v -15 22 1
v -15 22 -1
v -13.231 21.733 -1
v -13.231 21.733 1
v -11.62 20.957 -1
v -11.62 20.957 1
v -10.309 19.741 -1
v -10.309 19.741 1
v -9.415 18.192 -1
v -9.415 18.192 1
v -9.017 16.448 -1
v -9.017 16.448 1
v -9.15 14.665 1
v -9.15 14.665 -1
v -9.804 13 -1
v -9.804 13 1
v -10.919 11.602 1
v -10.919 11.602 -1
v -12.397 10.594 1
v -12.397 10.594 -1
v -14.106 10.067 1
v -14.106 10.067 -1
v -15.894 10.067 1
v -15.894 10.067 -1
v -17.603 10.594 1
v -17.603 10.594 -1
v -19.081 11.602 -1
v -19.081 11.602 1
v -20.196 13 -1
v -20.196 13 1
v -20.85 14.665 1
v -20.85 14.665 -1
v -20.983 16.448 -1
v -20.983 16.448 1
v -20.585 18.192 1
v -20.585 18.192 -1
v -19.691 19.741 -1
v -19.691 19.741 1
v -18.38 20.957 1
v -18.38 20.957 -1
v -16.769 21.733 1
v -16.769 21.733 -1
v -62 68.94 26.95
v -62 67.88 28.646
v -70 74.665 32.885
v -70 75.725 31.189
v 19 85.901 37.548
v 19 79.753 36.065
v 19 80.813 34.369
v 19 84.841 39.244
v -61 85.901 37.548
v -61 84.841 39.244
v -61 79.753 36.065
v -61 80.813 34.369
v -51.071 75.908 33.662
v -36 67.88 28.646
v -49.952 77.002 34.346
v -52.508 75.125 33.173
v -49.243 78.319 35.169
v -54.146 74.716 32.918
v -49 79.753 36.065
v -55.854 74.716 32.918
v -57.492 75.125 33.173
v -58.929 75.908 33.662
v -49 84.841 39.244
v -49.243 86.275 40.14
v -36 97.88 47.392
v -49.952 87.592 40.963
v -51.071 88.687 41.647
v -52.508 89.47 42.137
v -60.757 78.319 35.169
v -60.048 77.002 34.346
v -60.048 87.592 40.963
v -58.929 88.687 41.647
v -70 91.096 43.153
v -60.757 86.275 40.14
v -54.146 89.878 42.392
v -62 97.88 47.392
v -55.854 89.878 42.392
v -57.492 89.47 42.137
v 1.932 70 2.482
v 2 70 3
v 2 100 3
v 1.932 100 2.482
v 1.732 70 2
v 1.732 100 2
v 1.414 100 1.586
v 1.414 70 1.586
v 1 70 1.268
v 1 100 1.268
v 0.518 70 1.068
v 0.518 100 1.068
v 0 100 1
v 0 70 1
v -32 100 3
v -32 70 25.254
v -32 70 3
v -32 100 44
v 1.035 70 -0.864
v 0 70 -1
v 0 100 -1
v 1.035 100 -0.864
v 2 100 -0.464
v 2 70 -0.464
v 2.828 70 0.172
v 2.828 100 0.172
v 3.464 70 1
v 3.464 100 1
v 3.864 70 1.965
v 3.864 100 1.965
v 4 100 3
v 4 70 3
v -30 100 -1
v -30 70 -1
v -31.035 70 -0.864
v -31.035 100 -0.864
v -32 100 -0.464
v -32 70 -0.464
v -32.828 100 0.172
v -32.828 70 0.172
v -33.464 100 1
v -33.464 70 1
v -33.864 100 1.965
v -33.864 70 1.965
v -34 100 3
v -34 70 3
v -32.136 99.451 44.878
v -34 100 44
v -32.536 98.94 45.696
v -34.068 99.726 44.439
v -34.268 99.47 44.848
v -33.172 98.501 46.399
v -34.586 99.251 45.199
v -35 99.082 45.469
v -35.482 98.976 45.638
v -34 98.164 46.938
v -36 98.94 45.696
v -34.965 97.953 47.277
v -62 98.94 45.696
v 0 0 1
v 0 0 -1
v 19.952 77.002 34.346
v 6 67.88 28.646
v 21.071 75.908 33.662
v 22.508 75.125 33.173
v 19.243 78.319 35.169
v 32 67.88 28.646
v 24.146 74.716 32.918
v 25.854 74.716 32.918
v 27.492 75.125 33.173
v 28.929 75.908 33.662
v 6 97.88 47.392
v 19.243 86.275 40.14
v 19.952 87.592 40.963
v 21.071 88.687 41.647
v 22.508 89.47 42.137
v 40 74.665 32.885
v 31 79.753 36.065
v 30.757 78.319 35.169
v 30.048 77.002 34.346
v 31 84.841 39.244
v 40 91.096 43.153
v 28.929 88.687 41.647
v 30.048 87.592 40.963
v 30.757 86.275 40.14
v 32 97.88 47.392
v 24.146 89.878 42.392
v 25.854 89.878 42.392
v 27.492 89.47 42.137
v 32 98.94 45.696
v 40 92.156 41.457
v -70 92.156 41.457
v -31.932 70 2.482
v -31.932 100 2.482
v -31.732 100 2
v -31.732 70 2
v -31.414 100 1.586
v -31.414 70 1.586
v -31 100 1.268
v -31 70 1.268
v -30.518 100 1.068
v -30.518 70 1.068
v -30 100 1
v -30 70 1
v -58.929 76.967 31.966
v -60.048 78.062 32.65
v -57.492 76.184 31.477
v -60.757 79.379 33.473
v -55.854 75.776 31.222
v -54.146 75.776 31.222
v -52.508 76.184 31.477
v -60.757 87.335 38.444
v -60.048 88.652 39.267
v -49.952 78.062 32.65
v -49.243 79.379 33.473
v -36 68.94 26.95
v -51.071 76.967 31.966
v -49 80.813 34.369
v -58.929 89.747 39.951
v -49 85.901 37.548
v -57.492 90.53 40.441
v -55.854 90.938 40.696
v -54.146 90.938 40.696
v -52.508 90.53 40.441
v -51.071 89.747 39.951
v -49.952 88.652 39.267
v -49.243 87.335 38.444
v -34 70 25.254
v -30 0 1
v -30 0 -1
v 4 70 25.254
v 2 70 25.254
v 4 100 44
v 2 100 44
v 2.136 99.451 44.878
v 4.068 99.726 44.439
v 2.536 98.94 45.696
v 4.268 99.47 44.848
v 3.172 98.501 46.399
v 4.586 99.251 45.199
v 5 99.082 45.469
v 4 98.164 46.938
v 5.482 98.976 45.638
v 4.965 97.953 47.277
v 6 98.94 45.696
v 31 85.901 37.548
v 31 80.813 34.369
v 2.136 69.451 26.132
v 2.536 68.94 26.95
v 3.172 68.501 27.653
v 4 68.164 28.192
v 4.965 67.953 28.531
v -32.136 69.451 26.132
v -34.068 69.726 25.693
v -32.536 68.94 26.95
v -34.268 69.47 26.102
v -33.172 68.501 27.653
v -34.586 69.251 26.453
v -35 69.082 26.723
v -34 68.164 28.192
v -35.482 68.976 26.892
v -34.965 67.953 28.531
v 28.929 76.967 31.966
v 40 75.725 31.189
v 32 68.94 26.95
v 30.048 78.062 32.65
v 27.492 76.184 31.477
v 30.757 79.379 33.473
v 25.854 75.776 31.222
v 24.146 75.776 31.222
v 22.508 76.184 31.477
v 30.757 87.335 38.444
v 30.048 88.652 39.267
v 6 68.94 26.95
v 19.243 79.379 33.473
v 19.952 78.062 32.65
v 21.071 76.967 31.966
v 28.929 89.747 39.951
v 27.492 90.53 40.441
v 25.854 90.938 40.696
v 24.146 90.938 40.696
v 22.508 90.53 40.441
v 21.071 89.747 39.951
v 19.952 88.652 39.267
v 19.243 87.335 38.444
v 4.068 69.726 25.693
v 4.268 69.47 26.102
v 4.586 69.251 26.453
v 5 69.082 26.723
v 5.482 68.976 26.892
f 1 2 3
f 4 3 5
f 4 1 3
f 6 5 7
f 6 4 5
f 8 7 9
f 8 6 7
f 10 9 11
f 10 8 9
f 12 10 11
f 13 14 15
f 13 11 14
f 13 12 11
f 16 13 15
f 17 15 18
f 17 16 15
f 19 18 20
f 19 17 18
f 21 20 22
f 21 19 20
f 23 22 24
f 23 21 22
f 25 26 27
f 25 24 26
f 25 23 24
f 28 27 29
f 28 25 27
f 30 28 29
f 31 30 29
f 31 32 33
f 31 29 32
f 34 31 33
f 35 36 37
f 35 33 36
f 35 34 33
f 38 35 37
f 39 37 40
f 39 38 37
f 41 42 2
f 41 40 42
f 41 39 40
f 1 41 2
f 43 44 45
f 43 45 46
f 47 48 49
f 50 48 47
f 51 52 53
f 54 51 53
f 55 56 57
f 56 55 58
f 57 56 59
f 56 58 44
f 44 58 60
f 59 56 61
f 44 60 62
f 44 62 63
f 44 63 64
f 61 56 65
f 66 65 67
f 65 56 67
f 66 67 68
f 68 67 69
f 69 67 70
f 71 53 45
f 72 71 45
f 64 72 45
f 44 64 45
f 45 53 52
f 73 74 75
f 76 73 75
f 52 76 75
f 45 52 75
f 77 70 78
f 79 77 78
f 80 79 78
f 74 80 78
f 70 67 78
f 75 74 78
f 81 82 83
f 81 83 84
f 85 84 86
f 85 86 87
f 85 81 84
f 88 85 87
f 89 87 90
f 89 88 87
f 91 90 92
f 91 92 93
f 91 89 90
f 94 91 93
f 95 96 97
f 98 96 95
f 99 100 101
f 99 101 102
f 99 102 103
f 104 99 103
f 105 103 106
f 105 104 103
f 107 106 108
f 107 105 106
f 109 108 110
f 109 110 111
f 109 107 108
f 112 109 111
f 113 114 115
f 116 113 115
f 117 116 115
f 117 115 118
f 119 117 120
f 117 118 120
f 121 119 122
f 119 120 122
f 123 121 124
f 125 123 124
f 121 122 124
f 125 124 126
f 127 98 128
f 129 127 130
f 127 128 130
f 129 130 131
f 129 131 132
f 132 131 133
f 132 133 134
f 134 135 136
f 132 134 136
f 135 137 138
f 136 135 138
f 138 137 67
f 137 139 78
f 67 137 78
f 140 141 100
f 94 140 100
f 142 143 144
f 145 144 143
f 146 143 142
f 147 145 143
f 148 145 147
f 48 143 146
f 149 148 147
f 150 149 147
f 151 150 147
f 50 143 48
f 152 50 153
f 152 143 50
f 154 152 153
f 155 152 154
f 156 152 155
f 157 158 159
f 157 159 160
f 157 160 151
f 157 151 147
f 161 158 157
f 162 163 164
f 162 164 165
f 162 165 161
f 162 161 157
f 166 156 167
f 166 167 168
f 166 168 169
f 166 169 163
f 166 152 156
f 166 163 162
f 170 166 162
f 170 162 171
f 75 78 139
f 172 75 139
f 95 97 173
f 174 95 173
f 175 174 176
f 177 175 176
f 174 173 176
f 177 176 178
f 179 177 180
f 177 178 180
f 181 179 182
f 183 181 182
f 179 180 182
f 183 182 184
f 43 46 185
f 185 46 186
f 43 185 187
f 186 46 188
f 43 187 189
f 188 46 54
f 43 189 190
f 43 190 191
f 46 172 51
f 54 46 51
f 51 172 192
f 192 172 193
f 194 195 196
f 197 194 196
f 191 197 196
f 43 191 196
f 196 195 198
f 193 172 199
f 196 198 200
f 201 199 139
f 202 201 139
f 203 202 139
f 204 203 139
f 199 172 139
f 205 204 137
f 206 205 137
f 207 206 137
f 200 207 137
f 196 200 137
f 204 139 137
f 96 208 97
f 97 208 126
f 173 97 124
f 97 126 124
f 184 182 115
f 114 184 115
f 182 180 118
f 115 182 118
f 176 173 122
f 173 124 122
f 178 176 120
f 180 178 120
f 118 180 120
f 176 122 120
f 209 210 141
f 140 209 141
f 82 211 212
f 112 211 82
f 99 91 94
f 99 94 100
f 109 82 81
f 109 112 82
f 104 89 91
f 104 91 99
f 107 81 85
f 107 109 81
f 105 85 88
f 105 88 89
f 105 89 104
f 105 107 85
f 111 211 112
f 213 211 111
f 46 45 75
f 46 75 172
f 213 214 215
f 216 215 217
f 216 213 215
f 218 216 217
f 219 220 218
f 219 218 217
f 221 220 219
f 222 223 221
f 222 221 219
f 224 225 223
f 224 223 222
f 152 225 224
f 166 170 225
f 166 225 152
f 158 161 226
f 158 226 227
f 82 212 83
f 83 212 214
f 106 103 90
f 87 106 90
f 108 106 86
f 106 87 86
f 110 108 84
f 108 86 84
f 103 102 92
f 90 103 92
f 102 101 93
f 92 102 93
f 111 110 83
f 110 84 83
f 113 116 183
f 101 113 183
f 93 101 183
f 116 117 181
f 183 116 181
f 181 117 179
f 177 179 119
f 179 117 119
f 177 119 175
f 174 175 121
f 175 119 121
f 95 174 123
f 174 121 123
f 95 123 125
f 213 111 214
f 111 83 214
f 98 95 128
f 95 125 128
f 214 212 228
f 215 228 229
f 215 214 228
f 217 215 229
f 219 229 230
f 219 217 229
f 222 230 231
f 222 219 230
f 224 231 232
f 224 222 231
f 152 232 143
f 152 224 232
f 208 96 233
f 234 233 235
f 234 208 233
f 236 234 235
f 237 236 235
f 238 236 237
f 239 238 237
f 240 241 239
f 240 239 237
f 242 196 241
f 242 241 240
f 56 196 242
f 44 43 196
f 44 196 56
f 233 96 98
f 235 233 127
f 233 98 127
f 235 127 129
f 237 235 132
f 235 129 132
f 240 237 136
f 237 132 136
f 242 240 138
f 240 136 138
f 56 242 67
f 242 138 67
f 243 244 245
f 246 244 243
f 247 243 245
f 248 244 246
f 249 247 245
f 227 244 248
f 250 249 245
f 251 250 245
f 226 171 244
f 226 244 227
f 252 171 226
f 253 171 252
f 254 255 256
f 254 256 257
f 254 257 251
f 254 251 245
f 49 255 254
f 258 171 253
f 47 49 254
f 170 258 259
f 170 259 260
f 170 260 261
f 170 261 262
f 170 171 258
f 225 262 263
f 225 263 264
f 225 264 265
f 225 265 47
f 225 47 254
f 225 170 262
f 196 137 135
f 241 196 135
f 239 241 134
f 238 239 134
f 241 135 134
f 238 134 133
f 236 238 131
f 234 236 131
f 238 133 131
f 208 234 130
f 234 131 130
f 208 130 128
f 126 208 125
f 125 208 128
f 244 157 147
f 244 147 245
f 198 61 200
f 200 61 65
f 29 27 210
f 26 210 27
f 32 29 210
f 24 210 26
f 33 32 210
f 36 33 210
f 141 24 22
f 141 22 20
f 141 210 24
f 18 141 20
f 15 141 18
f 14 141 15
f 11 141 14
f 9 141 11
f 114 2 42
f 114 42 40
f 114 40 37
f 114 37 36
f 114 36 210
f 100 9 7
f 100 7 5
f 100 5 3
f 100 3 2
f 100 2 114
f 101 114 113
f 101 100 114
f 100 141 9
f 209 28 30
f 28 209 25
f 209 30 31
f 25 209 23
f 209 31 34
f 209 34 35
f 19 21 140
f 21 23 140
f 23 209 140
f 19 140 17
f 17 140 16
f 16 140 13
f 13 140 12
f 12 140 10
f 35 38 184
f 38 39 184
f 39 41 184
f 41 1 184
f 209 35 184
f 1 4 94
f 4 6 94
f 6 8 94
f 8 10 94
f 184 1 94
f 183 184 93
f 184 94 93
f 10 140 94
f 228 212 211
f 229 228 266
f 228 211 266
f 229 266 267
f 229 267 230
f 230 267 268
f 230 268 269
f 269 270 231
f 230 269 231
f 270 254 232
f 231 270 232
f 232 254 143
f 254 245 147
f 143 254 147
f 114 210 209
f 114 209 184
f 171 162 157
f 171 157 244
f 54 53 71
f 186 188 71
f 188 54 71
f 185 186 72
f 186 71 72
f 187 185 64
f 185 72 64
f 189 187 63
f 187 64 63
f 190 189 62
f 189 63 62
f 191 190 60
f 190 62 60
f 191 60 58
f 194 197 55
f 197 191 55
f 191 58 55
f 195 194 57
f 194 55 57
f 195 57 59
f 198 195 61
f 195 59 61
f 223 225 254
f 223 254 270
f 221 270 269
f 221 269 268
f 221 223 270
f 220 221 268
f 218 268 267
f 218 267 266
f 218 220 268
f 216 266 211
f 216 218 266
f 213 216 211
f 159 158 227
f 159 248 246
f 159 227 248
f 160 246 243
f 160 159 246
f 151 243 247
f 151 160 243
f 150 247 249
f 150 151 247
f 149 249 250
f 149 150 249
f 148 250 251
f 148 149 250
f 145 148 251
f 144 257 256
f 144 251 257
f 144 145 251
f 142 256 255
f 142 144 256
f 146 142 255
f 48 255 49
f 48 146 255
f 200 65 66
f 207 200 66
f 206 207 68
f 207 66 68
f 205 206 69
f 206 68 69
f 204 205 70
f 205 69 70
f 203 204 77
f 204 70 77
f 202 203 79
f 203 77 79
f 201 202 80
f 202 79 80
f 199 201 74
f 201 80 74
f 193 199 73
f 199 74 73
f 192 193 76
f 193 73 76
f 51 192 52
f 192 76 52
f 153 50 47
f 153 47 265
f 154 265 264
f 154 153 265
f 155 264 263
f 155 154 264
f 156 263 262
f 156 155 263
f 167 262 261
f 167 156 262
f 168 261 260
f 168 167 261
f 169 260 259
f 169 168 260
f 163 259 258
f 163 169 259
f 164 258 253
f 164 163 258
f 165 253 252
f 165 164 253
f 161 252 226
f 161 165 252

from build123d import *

# Parameters (mm, degrees)
BASE_FLANGE1_START      = -1
BASE_FLANGE1_OUTLINE_W  = 100
BASE_FLANGE1_OUTLINE_H  = 30
BASE_FLANGE1_DEPTH      = 2
EDGE_FLANGE1_DEPTH      = 30
EDGE_FLANGE1_START      = 2
EDGE_FLANGE1_FLAT_DEPTH = 2
SKETCH11_R              = 6
CUT_EXTRUDE2_DEPTH      = 2
EDGE_FLANGE2_DEPTH      = 35.375352101
CUT_EXTRUDE1_DEPTH      = 10
CHAMFER1_SIZE           = 8


# Read off the part's stored shape, not the designer's step: Base-Flange1
# Sheet-metal steps are written as plain solids
with BuildPart() as part:
    # Base-Flange1 outline → Base-Flange1 (new body)
    with BuildSketch(Plane(origin=(0, 0, 0), x_dir=(0, 1, 0), z_dir=(0, 0, 1)).offset(BASE_FLANGE1_START)):
        with Locations((50, 15)):
            Rectangle(BASE_FLANGE1_OUTLINE_W, BASE_FLANGE1_OUTLINE_H)
    extrude(amount=BASE_FLANGE1_DEPTH)

    # Edge-Flange1 bend section (across the edge) → Edge-Flange1 (add)
    with BuildSketch(Plane(origin=(2, 70, 1), x_dir=(-1, 0, 0), z_dir=(0, 1, 0))):
        with BuildLine():
            Line((-2, 2), (0, 2))
            ThreePointArc((0, 2), (0.585786438, 0.585786438), (2, 0))
            Line((2, 0), (2, -2))
            ThreePointArc((2, -2), (-0.828427125, -0.828427125), (-2, 2))
        make_face()
    extrude(amount=EDGE_FLANGE1_DEPTH)

    # Edge-Flange1 profile (on flange) → Edge-Flange1 flat (add)
    with BuildSketch(Plane(origin=(2, 0, 1), x_dir=(0, 1, 0), z_dir=(1, 0, 0)).offset(EDGE_FLANGE1_START)):
        Polygon((70, 2), (100, 2), (100, 43), (70, 24.253919443), align=None)
    extrude(amount=-EDGE_FLANGE1_FLAT_DEPTH)

    # Sketch11 → Cut-Extrude2 (cut)
    with BuildSketch(Plane.XY.offset(1)):
        with Locations((-15, 16)):
            Circle(SKETCH11_R)
    extrude(amount=-CUT_EXTRUDE2_DEPTH, mode=Mode.SUBTRACT)

    # Edge-Flange2 section (across the edge) → Edge-Flange2 (add)
    with BuildSketch(Plane(origin=(4, 98.940161472, 45.696096192), x_dir=(0, 0.5299192642332061, -0.8480480961564253), z_dir=(-1.8389111764499846e-15, -0.8480480961564253, -0.5299192642332061))):
        with BuildLine():
            Line((-2, 2), (-2, 36))
            Line((-2, 36), (0, 36))
            Line((0, 36), (0, 2))
            ThreePointArc((0, 2), (0.585786438, 0.585786438), (2, 0))
            Line((2, 0), (2, -2))
            ThreePointArc((2, -2), (-0.828427125, -0.828427125), (-2, 2))
        make_face()
    extrude(amount=EDGE_FLANGE2_DEPTH)

    # Sketch15 → Cut-Extrude1 (cut)
    with BuildSketch(Plane(origin=(0, 6.188296585, -9.903344701), x_dir=(1, 0, 0), z_dir=(0, -0.5299192642332063, 0.8480480961564252))):
        with BuildLine():
            Line((31, 92.745905141), (31, 86.745905141))
            ThreePointArc((31, 86.745905141), (25, 80.745905141), (19, 86.745905141))
            Line((19, 86.745905141), (19, 92.745905141))
            ThreePointArc((19, 92.745905141), (25, 98.745905141), (31, 92.745905141))
        make_face()
    extrude(amount=-CUT_EXTRUDE1_DEPTH, mode=Mode.SUBTRACT)

    # Chamfer1
    chamfer1_edges = [part.edges().sort_by_distance(p)[0] for p in [
        (40, 98.410242207, 46.544144288),
        (40, 68.410242207, 27.798063731),
    ]]
    chamfer(chamfer1_edges, length=CHAMFER1_SIZE)

    # SurfaceCut1
    split(bisect_by=Plane.YZ.offset(-15), keep=Keep.TOP)

    # Mirror1: part across plane


with BuildPart() as part_1:
    add(part.part)
    add(part.part.mirror(Plane(origin=(-15, 0, 0), x_dir=(0, 0, 1), z_dir=(1, 0, 0))))


solid = part_1.part
